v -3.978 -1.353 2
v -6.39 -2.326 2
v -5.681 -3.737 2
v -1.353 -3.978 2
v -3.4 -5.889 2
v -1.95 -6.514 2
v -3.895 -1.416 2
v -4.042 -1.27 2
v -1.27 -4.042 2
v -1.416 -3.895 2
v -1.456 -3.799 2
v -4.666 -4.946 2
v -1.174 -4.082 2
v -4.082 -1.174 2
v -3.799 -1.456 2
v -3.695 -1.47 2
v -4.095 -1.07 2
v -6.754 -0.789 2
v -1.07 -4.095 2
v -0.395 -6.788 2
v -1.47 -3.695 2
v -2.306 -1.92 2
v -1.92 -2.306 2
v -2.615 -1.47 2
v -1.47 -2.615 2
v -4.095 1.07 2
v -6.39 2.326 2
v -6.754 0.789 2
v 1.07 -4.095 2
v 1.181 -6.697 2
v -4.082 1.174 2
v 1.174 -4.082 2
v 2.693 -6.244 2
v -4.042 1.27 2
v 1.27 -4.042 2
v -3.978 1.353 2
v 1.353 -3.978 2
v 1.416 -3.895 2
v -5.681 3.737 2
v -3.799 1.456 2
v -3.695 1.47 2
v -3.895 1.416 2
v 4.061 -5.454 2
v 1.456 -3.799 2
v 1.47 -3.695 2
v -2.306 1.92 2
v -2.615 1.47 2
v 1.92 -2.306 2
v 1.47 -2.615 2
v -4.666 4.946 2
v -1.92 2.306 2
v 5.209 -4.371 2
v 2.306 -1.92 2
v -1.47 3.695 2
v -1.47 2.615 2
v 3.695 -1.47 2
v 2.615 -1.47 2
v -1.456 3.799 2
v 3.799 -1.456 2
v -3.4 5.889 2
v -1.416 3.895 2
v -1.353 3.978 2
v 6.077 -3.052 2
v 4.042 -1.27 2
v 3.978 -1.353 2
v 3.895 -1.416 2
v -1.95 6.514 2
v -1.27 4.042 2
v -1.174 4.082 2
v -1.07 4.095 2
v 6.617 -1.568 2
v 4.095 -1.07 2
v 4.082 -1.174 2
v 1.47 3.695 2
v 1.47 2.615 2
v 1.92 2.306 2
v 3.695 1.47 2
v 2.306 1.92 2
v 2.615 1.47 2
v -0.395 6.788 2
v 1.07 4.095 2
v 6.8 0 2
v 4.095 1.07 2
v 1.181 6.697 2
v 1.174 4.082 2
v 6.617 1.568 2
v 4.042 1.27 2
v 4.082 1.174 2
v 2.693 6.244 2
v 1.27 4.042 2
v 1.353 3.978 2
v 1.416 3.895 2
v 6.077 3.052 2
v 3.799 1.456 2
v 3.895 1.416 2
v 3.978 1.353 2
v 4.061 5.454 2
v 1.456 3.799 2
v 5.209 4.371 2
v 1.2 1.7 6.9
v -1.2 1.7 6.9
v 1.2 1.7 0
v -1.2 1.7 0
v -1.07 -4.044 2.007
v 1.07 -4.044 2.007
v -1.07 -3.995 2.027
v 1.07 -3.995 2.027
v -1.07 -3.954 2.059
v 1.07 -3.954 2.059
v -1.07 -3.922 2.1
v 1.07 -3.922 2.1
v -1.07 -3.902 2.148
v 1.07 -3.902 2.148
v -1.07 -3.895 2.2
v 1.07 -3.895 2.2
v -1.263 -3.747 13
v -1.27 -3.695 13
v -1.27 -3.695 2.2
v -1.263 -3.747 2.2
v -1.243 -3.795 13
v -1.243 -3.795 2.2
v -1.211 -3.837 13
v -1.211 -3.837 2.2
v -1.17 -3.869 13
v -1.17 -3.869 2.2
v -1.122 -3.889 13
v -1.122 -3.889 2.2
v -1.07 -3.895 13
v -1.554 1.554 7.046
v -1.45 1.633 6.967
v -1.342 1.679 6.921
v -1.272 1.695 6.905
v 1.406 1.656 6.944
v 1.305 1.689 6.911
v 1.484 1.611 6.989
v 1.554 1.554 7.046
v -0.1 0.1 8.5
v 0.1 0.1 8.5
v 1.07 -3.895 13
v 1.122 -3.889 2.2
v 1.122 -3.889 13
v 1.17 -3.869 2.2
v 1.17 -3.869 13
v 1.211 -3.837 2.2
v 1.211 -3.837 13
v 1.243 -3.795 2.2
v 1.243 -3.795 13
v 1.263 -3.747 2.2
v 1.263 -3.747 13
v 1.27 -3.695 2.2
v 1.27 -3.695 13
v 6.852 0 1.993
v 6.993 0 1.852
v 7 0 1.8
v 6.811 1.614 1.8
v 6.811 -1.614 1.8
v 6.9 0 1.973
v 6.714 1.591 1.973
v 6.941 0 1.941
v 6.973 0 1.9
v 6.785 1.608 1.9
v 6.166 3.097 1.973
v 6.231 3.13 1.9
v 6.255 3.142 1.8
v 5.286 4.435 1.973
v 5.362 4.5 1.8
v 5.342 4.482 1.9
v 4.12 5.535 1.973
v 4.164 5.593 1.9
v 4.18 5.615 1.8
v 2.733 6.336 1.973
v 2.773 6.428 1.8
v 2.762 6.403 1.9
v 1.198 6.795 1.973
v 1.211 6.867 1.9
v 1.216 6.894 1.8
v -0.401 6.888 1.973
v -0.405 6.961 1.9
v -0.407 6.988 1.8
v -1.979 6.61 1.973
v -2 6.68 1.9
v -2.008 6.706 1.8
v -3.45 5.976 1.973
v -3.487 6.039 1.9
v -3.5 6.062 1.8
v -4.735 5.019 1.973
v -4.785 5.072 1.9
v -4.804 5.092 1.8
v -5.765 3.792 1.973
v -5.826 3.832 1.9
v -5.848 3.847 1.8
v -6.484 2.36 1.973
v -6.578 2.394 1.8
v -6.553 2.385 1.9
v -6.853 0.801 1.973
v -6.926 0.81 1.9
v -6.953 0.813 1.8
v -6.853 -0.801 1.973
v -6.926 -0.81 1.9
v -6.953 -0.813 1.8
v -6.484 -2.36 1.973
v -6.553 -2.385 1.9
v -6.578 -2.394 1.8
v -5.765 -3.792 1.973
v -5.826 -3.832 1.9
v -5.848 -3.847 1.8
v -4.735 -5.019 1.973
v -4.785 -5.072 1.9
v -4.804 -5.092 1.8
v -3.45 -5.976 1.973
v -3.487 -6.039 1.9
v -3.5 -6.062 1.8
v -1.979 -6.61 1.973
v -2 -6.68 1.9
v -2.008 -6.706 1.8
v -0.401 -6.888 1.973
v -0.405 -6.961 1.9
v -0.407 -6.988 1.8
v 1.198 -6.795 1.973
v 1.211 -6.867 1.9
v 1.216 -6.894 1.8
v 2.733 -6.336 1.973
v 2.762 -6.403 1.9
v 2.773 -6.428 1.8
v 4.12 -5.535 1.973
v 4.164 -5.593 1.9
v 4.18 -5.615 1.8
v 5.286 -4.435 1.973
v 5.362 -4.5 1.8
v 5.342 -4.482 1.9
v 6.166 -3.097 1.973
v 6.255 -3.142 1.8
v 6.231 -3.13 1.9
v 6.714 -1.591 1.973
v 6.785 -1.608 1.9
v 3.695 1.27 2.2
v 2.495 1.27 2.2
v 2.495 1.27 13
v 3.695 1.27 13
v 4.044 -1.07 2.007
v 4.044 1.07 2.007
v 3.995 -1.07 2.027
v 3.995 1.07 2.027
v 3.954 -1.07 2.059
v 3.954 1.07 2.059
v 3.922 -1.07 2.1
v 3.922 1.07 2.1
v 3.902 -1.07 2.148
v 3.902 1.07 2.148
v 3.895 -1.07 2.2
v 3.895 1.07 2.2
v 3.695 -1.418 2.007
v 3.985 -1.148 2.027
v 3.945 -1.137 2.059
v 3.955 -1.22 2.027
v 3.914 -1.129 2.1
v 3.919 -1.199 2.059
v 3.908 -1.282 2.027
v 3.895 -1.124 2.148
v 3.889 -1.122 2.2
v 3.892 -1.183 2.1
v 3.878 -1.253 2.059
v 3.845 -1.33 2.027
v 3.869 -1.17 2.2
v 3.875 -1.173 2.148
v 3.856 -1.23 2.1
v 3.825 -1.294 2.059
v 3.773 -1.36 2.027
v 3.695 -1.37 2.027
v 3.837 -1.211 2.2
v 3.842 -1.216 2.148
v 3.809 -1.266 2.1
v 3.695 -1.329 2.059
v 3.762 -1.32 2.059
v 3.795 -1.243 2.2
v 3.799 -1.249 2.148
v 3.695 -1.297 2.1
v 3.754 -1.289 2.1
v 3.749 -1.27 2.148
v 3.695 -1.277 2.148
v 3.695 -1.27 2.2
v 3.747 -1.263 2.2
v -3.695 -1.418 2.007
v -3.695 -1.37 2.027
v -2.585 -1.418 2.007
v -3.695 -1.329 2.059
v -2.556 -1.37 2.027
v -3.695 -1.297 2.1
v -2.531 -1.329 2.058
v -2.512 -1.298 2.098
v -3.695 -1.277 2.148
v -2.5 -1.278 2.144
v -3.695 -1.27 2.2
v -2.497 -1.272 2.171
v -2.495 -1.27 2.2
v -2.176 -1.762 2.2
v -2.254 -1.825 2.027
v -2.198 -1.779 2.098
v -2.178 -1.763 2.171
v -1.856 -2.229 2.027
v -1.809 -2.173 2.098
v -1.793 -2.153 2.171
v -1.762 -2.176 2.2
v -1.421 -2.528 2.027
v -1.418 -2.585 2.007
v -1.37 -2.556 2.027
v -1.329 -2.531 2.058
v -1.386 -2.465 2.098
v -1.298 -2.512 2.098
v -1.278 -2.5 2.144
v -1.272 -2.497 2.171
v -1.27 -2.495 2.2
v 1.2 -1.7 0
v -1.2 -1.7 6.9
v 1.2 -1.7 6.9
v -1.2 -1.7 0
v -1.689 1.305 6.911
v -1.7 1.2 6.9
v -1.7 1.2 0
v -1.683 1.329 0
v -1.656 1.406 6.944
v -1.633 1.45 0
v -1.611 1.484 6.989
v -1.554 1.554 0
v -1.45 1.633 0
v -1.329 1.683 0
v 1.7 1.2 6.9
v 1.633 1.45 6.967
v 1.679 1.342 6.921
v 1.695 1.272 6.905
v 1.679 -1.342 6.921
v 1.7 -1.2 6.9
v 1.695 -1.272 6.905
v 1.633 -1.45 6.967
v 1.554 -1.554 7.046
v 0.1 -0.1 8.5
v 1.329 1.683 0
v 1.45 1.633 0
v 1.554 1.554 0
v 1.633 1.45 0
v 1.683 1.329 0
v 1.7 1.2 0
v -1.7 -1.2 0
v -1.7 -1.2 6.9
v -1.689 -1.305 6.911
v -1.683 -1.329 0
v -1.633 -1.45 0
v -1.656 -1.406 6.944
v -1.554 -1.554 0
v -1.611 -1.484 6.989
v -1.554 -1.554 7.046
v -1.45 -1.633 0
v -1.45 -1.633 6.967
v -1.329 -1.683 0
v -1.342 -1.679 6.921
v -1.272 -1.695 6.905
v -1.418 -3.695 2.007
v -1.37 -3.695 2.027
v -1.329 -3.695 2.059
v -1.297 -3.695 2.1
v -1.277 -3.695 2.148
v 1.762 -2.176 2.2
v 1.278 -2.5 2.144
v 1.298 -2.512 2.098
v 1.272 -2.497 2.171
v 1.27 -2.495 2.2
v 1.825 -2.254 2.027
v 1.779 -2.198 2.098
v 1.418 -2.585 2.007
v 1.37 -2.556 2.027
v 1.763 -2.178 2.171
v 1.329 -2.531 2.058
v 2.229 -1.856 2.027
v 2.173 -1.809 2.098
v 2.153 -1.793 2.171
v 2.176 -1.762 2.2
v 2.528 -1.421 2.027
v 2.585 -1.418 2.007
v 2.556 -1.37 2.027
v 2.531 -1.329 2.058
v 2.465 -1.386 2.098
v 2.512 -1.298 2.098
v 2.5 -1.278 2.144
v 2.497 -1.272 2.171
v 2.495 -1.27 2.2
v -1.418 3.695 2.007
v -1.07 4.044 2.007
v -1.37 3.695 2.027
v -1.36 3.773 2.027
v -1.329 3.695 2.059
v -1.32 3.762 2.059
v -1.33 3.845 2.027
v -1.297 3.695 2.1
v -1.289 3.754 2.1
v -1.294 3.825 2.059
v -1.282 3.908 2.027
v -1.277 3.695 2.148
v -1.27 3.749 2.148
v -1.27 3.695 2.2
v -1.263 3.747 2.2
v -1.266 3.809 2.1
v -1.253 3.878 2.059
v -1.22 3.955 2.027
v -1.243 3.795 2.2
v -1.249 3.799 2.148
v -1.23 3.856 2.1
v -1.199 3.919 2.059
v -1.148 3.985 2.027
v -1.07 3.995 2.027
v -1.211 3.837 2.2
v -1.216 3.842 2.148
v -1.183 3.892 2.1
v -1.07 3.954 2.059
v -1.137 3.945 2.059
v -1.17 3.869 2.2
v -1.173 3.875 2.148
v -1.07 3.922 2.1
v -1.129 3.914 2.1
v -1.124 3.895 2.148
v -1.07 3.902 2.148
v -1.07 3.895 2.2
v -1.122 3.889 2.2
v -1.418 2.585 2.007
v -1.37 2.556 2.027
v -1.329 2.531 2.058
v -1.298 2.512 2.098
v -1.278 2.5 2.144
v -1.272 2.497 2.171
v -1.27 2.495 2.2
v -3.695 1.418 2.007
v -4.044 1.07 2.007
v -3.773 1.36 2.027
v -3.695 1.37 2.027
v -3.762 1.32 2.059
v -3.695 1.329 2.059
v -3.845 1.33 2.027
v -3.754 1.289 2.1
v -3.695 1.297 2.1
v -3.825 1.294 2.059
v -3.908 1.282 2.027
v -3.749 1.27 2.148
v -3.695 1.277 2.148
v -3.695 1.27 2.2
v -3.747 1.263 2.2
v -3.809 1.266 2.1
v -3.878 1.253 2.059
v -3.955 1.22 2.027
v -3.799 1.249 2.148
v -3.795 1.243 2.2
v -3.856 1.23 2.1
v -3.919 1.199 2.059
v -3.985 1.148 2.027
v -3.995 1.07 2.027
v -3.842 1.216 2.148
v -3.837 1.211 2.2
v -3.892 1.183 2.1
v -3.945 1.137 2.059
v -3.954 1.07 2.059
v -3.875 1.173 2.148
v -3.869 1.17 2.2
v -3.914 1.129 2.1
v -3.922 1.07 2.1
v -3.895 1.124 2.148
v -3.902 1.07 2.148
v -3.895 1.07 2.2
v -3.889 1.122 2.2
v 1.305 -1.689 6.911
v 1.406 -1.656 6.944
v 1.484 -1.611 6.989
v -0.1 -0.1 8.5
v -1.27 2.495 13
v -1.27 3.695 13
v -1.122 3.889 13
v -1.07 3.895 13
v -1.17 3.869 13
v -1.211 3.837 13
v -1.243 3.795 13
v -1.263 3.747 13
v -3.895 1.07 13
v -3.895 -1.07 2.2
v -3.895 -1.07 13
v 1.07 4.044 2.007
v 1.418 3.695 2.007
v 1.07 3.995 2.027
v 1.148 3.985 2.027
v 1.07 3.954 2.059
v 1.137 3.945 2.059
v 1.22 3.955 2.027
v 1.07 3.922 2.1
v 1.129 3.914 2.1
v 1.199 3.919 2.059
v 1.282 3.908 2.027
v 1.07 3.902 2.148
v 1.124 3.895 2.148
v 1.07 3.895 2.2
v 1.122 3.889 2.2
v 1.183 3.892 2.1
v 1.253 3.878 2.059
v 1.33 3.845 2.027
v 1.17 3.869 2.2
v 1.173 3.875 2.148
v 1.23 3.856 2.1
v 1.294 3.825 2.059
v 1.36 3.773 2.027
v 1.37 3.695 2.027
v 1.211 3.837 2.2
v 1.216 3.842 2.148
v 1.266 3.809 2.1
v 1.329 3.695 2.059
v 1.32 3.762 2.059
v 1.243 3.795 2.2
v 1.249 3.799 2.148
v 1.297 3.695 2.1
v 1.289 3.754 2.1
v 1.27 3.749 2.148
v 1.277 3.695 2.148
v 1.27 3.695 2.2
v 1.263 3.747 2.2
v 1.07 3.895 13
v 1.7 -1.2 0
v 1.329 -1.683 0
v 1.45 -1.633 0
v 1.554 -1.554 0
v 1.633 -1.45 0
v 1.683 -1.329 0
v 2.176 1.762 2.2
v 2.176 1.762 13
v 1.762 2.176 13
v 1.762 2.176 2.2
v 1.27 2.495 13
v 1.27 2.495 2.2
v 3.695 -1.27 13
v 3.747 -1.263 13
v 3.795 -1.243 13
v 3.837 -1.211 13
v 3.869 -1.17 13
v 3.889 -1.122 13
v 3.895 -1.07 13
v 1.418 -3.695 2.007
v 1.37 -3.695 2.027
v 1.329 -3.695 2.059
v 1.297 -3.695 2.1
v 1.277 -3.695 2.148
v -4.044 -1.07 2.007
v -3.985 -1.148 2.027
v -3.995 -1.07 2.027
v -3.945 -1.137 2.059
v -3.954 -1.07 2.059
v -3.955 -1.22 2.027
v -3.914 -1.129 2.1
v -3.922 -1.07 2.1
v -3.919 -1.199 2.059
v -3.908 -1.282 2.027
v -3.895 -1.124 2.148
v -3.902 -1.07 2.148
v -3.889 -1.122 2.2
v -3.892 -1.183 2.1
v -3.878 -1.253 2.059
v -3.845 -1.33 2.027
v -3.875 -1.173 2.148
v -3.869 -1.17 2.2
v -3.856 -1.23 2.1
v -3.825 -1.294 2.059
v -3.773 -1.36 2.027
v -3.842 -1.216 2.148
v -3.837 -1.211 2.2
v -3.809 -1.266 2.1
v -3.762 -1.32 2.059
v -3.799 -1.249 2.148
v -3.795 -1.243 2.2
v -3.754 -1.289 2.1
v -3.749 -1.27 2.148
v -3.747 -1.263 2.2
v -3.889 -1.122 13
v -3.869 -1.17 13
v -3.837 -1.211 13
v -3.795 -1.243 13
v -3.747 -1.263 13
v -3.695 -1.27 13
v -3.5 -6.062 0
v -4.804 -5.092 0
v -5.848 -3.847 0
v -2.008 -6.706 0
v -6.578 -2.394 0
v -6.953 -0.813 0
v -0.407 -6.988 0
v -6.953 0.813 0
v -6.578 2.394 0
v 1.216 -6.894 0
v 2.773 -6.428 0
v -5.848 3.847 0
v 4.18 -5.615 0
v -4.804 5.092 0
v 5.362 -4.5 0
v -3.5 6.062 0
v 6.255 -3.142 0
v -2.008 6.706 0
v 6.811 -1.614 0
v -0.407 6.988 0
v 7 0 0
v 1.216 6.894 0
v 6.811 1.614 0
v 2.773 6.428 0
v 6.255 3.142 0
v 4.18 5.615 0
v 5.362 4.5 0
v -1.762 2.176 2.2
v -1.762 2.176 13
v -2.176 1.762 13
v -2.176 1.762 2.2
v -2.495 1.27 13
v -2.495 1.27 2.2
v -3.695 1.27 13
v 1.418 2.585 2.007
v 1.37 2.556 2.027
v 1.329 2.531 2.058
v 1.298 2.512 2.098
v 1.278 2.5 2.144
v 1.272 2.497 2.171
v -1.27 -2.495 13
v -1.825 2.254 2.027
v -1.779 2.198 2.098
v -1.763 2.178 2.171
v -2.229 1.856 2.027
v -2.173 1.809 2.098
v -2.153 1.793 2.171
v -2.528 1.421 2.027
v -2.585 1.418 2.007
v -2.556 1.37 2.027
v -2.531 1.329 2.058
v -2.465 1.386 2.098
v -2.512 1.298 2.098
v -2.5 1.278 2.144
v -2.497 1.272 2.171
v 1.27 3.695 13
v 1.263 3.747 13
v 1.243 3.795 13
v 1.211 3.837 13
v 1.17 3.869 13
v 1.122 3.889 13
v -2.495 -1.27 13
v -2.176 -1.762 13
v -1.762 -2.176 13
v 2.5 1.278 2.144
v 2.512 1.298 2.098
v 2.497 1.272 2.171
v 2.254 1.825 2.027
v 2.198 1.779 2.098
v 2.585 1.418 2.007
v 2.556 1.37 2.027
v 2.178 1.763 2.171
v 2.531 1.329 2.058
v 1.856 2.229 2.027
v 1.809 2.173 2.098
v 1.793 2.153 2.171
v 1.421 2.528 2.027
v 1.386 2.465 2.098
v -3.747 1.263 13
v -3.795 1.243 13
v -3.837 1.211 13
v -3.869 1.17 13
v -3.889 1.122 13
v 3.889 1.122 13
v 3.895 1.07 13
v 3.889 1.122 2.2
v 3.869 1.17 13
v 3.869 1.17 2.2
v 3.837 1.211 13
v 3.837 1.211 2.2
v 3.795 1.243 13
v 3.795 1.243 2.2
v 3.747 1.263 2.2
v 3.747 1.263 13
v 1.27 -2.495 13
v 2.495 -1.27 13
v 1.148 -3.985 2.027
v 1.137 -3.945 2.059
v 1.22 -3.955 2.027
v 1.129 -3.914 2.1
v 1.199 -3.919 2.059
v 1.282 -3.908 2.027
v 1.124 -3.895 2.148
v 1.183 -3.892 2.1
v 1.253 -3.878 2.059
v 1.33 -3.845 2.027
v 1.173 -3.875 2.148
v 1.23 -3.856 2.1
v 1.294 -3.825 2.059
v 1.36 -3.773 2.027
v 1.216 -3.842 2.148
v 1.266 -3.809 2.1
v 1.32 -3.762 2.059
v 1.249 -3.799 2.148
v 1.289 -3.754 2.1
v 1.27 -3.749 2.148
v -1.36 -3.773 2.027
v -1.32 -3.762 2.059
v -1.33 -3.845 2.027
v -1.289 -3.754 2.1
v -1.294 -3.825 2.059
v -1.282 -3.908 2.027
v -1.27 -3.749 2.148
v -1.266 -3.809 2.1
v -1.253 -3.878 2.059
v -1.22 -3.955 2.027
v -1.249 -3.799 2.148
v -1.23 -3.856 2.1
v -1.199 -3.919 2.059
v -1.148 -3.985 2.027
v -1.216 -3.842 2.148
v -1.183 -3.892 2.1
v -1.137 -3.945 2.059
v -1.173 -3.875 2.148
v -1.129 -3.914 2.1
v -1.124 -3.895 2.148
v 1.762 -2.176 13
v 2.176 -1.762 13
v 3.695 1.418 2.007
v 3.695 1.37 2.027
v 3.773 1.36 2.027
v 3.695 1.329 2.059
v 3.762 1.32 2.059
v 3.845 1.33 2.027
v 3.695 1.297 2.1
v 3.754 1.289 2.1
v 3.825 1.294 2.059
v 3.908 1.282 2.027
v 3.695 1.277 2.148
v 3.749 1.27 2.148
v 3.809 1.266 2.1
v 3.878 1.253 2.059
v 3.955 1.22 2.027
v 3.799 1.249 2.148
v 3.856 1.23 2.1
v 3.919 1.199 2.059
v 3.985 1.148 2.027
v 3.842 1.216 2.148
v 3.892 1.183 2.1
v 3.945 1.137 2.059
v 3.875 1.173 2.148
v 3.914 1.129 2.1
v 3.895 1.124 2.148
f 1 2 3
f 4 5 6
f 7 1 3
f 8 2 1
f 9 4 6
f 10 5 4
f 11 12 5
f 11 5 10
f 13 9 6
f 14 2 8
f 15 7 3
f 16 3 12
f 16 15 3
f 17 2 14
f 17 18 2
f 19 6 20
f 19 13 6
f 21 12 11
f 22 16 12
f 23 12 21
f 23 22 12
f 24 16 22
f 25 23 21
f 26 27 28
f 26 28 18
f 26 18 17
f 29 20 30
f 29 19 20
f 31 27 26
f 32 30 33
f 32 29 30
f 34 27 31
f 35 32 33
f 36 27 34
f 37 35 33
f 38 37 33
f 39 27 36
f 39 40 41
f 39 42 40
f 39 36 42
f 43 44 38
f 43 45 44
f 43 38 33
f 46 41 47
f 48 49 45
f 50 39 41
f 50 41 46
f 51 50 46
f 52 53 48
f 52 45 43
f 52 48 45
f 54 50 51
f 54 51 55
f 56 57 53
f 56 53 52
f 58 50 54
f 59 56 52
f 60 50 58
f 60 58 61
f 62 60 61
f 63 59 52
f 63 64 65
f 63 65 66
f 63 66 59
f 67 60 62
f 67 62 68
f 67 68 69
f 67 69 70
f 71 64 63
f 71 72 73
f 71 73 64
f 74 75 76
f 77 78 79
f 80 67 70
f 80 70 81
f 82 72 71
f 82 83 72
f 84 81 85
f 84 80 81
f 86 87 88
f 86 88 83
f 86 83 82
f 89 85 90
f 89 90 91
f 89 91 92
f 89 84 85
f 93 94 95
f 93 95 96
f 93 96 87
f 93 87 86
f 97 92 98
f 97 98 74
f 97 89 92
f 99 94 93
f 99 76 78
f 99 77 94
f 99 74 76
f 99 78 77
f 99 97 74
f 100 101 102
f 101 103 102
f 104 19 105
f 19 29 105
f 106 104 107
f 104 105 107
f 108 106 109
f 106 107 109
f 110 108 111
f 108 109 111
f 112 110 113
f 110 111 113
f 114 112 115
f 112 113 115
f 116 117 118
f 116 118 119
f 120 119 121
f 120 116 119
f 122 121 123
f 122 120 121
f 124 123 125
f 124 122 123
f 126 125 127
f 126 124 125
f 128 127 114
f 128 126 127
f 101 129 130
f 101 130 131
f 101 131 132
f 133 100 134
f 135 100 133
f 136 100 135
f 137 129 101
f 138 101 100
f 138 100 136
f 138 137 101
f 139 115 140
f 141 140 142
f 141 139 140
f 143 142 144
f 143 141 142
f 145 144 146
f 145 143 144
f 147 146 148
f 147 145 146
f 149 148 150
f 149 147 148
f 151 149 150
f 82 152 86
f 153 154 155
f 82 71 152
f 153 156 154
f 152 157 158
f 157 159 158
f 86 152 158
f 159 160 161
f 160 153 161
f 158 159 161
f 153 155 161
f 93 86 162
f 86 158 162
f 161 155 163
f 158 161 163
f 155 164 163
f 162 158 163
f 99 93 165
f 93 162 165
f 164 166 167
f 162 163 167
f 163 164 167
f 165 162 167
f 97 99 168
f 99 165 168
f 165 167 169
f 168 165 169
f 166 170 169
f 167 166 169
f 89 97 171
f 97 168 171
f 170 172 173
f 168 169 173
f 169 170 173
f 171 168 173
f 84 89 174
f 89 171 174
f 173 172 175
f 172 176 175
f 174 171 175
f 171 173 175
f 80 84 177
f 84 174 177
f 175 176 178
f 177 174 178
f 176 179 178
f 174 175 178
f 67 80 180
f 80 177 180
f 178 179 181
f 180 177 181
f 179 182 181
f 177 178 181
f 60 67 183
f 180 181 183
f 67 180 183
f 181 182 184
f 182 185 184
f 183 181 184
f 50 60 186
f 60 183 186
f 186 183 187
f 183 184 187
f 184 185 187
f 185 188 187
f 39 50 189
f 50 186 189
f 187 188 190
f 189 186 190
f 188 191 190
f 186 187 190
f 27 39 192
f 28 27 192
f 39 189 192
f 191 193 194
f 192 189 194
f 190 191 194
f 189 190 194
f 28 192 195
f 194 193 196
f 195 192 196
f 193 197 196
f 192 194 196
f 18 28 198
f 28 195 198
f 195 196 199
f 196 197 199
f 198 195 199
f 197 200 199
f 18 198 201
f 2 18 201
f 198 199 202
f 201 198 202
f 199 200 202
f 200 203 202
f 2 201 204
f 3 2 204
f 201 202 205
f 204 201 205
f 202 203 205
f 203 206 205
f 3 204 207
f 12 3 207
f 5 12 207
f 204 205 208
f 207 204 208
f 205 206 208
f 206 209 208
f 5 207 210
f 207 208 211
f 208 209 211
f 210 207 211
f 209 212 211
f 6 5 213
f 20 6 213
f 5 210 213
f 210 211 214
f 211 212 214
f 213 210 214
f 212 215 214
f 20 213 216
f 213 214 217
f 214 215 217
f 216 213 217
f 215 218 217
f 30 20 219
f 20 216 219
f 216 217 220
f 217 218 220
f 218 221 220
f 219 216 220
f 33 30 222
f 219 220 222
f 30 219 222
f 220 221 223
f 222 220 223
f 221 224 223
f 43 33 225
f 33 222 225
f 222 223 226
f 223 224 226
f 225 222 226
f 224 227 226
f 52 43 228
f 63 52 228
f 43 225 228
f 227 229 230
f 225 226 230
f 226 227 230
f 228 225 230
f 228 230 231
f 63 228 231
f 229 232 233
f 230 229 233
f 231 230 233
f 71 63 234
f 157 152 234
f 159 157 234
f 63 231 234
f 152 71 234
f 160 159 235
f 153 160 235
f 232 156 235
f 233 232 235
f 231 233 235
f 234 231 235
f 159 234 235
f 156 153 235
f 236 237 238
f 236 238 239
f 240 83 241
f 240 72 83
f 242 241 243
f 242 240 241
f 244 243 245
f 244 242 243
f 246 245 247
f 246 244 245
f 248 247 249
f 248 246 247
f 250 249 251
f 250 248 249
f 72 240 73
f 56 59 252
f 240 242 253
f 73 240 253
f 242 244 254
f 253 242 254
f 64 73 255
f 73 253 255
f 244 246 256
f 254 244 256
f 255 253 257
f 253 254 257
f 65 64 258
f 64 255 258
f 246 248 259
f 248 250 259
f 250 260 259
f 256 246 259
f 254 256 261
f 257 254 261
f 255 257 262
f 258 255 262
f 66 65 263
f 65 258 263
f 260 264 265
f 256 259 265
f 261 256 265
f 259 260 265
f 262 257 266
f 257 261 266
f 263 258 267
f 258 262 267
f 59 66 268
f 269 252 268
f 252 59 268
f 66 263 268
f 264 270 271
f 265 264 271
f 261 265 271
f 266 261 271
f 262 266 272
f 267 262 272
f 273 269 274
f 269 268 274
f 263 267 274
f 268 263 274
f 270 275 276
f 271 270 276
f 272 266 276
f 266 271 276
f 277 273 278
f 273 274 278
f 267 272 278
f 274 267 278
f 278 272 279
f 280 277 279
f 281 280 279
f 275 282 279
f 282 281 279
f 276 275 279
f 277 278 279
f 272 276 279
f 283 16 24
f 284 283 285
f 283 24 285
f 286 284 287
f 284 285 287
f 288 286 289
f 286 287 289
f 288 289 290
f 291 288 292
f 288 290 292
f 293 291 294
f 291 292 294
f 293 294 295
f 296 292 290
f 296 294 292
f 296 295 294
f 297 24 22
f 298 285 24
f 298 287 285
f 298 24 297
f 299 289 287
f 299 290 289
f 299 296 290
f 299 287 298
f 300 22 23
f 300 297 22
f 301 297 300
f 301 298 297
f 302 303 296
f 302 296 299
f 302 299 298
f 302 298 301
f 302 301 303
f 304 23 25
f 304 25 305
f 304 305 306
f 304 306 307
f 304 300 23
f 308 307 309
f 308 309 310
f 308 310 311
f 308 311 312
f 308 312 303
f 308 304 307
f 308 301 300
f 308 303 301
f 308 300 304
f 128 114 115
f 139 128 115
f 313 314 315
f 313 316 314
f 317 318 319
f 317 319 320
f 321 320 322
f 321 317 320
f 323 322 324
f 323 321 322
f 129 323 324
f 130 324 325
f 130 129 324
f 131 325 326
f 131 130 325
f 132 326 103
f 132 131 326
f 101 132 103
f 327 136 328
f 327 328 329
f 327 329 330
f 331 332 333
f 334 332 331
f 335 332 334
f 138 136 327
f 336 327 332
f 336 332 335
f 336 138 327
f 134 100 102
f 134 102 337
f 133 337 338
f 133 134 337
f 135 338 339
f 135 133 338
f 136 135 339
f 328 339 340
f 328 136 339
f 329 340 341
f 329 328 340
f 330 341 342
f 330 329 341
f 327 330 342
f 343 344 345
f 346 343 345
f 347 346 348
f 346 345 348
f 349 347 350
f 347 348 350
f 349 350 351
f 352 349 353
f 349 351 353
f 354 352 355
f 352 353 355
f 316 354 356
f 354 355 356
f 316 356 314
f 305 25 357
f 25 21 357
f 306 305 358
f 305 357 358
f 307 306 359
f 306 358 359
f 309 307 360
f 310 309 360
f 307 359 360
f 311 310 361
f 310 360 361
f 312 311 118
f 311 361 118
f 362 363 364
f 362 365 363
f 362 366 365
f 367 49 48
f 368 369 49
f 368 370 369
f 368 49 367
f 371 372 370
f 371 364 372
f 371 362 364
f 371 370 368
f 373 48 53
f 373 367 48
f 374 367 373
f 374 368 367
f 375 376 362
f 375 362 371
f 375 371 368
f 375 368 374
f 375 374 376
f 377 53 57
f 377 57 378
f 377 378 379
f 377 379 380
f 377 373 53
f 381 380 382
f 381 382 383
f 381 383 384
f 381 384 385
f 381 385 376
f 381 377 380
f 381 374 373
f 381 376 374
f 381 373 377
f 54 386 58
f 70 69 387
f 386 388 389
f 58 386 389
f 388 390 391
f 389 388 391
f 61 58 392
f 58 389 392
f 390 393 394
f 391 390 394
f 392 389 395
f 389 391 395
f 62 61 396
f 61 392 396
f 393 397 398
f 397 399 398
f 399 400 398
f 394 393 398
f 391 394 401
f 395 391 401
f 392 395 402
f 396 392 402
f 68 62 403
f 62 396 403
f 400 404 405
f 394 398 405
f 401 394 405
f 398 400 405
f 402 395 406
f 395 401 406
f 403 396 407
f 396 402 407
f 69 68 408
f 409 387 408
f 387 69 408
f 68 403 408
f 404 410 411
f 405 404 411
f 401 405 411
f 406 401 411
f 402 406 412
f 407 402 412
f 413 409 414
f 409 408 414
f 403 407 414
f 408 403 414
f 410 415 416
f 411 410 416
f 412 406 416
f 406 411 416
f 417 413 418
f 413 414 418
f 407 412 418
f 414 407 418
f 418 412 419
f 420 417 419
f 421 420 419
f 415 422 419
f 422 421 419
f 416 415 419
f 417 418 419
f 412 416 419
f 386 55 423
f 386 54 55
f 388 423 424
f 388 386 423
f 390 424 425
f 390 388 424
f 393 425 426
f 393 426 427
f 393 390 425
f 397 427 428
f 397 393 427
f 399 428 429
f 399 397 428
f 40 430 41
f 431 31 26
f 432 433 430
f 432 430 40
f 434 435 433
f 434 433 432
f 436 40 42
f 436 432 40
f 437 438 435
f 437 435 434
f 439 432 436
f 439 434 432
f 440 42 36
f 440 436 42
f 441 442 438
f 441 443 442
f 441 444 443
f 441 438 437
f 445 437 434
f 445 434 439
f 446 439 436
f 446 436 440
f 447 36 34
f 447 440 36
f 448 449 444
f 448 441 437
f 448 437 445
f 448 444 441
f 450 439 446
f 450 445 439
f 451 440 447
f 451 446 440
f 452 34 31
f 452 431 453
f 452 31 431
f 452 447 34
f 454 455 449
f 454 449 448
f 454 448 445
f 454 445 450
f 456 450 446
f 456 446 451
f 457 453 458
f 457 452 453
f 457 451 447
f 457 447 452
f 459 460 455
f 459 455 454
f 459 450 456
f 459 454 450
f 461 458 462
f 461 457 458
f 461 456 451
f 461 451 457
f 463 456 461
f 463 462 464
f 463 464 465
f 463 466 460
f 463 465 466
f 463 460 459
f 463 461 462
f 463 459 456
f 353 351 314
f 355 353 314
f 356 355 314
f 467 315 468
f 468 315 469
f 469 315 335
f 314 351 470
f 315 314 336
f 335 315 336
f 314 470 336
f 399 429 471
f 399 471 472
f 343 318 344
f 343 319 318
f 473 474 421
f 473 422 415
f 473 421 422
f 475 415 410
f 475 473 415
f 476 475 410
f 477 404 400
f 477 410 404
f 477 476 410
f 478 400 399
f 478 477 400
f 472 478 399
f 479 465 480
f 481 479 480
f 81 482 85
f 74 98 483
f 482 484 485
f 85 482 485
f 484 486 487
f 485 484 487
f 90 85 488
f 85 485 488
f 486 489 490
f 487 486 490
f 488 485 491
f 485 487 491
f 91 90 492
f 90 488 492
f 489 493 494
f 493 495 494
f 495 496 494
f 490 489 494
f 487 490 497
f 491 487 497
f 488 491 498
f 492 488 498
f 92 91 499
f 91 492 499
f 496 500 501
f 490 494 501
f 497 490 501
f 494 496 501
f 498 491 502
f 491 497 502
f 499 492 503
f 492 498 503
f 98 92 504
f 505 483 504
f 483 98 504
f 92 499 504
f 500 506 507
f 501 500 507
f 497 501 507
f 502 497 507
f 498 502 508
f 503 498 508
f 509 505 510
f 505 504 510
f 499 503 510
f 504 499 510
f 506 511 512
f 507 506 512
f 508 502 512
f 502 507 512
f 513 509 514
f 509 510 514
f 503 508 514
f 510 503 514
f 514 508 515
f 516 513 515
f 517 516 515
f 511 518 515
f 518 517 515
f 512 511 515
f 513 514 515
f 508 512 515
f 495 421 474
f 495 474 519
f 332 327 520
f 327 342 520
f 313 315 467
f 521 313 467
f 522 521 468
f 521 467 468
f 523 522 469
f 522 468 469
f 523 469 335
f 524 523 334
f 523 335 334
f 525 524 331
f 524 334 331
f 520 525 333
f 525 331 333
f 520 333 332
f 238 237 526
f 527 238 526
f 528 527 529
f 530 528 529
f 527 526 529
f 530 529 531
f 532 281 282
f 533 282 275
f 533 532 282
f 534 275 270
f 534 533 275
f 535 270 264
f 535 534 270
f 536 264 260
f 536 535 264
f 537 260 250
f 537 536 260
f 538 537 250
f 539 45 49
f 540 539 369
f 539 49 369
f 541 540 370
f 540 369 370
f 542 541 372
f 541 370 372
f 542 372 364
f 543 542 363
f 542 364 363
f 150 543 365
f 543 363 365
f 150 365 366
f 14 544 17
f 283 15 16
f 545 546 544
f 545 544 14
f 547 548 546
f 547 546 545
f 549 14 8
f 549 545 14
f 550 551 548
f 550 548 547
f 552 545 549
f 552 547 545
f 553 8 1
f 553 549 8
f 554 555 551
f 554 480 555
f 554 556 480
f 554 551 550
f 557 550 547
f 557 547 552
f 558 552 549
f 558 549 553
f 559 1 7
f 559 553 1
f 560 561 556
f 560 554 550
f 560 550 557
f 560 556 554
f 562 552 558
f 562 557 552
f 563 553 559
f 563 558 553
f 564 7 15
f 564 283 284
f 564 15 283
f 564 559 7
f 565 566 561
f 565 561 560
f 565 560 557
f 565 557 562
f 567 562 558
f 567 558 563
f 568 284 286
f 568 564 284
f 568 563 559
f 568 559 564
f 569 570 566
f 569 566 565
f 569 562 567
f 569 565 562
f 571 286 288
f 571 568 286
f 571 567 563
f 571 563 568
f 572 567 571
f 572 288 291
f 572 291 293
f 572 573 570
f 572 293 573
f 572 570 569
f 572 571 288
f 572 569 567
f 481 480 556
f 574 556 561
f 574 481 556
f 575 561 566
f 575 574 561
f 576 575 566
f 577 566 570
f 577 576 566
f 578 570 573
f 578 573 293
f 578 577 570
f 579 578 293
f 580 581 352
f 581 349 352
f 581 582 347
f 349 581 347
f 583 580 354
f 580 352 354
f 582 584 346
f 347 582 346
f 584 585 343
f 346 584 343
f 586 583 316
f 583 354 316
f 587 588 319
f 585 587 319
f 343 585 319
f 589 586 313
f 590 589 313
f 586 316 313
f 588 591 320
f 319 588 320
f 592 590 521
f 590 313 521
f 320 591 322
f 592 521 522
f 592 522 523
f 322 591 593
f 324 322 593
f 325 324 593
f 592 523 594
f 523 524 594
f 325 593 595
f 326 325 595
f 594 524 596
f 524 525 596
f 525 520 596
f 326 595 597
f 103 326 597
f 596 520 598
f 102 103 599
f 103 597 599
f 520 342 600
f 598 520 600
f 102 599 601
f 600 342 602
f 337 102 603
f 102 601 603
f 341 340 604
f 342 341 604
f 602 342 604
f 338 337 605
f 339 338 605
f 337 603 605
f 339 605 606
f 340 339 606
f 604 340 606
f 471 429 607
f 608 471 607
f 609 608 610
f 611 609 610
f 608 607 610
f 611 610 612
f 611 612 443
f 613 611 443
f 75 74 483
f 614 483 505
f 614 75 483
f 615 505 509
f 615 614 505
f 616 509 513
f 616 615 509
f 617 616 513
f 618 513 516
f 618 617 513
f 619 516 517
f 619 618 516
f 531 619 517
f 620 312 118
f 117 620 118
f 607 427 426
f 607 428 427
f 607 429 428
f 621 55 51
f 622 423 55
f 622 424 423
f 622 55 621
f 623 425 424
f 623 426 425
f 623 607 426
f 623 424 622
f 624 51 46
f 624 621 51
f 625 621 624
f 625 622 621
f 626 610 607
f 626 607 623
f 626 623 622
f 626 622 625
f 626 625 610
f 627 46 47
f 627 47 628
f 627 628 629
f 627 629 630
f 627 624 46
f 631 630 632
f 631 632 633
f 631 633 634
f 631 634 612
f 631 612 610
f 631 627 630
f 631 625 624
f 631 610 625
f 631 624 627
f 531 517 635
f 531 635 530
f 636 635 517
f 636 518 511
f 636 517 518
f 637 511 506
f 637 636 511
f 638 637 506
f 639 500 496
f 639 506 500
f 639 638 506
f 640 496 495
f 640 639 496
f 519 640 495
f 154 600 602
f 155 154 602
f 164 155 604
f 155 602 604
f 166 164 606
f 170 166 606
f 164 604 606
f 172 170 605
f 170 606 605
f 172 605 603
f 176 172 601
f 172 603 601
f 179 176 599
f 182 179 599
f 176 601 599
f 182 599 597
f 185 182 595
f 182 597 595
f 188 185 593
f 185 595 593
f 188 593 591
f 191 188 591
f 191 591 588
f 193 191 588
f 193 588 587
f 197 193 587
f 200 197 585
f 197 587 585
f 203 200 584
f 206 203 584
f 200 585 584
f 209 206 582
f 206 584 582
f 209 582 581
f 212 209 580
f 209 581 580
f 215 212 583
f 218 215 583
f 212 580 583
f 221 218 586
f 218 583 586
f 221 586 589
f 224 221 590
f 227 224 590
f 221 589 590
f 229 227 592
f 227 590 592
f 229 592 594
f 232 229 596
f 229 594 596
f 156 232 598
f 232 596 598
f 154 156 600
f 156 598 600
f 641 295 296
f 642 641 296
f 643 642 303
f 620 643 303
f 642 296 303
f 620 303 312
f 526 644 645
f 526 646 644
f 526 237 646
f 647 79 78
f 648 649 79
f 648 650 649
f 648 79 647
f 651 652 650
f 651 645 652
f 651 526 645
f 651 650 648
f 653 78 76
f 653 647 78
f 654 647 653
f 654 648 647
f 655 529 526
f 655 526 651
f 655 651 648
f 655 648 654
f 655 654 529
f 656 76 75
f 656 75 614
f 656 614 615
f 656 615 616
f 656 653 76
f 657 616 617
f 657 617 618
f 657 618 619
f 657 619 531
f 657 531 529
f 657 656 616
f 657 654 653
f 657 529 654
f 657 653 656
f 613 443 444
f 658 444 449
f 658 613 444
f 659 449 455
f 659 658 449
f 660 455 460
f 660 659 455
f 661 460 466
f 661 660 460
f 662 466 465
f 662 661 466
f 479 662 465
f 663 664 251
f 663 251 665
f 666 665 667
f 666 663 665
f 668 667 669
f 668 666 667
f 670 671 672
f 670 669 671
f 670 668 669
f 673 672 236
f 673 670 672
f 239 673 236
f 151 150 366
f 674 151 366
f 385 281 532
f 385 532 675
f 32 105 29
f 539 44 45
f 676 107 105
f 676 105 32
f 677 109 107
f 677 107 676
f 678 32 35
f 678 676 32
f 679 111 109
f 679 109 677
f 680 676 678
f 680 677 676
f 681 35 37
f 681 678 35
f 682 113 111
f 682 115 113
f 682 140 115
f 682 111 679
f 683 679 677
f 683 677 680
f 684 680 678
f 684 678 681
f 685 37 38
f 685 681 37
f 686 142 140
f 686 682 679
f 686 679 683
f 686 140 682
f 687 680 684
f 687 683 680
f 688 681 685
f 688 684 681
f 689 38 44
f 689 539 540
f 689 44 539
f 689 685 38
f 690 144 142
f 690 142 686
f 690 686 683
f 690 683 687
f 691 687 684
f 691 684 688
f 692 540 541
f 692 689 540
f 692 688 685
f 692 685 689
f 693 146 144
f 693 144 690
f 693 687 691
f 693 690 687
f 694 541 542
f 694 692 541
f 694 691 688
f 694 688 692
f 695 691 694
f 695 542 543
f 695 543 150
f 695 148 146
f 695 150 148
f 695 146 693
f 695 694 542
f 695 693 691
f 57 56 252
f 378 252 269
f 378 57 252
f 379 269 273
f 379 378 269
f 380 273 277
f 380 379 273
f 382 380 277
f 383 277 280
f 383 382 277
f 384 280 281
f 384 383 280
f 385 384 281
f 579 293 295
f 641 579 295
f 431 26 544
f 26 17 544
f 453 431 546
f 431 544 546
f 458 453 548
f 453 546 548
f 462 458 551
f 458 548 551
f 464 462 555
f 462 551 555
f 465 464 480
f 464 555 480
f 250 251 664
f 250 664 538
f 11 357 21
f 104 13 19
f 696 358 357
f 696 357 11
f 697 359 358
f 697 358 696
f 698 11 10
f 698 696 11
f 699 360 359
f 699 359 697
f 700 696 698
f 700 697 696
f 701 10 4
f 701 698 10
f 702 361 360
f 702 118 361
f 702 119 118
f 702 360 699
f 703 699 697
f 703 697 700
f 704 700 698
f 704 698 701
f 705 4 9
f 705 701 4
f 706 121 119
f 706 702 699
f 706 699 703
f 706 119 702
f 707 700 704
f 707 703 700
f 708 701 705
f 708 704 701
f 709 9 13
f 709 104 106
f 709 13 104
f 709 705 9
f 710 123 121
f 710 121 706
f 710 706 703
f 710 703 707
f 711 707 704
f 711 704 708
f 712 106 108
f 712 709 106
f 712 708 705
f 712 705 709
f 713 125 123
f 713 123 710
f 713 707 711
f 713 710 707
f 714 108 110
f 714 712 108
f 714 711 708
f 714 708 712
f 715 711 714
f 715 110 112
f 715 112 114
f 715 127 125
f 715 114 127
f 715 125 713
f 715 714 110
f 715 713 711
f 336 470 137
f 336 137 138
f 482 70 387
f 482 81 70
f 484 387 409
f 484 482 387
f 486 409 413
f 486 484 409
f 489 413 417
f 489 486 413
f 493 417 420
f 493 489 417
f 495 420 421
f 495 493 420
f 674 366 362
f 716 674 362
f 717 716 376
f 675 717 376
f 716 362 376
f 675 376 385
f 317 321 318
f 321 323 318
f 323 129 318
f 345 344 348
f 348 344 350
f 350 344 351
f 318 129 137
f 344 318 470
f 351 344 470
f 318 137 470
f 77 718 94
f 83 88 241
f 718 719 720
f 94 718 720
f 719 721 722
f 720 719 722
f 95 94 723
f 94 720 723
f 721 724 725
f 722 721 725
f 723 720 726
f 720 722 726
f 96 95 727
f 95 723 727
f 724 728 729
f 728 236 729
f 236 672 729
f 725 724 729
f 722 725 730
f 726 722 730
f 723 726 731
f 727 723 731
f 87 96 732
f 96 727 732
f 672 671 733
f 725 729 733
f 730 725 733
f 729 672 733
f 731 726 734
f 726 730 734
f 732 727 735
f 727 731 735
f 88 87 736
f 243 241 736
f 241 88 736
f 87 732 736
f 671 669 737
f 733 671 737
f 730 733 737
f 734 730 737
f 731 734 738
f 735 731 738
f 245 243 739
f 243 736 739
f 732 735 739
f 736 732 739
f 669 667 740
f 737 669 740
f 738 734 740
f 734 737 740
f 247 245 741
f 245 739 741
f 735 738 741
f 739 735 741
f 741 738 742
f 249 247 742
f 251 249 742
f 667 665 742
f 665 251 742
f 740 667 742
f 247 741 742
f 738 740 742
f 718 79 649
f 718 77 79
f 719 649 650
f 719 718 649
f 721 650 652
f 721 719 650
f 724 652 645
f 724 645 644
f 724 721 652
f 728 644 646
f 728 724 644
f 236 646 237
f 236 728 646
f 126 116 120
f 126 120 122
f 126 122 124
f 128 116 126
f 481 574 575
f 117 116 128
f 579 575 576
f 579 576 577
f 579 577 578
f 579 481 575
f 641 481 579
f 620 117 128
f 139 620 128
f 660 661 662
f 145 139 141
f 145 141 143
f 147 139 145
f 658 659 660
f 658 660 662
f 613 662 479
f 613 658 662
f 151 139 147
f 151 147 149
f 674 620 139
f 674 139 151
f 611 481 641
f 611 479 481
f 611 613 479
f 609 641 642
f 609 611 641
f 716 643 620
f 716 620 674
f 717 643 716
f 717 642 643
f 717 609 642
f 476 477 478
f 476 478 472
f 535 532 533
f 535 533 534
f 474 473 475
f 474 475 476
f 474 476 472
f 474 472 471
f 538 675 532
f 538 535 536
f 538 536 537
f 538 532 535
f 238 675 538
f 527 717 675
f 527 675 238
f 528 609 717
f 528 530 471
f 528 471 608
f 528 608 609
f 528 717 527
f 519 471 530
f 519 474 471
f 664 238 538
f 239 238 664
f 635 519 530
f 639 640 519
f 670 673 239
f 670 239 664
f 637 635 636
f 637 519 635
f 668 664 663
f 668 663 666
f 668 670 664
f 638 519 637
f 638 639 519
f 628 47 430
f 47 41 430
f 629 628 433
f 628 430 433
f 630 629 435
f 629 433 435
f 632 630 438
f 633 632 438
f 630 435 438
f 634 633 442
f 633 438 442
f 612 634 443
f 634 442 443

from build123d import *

# Parameters (mm, degrees)
SKETCH_R     = 7
PAD_DEPTH    = 2
PAD001_DEPTH = 11
SKETCH002_W  = 3.4
SKETCH002_H  = 3.4
POCKET_DEPTH = 8.5
FILLET_R     = 0.2
FILLET001_R  = 0.2
CHAMFER_SIZE = 1.6
FILLET002_R  = 0.5


with BuildPart() as part:
    # Sketch → Pad (new body)
    with BuildSketch(Plane.XY):
        Circle(SKETCH_R)
    extrude(amount=PAD_DEPTH)

    # Sketch001 (on Face3 of Pad) → Pad001 (join)
    with BuildSketch(Plane.XY.offset(2)):
        with BuildLine():
            ThreePointArc((-1.27, 2.495416), (-1.979899, 1.979899), (-2.495416, 1.27))
            Line((-2.495416, 1.27), (-3.895416, 1.27))
            Line((-3.895416, 1.27), (-3.895416, -1.27))
            Line((-3.895416, -1.27), (-2.495416, -1.27))
            ThreePointArc((-2.495416, -1.27), (-1.979899, -1.979899), (-1.27, -2.495416))
            Line((-1.27, -2.495416), (-1.27, -3.895416))
            Line((-1.27, -3.895416), (1.27, -3.895416))
            Line((1.27, -3.895416), (1.27, -2.495416))
            ThreePointArc((1.27, -2.495416), (1.979899, -1.979899), (2.495416, -1.27))
            Line((3.895416, -1.27), (2.495416, -1.27))
            Line((3.895416, 1.27), (3.895416, -1.27))
            Line((2.495416, 1.27), (3.895416, 1.27))
            ThreePointArc((2.495416, 1.27), (1.979899, 1.979899), (1.27, 2.495416))
            Line((1.27, 3.895416), (1.27, 2.495416))
            Line((-1.27, 3.895416), (1.27, 3.895416))
            Line((-1.27, 2.495416), (-1.27, 3.895416))
        make_face()
    extrude(amount=PAD001_DEPTH)

    # Sketch002 (on Face2 of Pad001) → Pocket (cut)
    with BuildSketch(Plane(origin=(0, 0, 0), x_dir=(1, 0, 0), z_dir=(0, 0, -1))):
        Rectangle(SKETCH002_W, SKETCH002_H)
    extrude(amount=-POCKET_DEPTH, mode=Mode.SUBTRACT)

    # Fillet
    fillet_edges = [part.edges().sort_by_distance(p)[0] for p in [
        (-3.895416, -1.27, 7.5),
        (-1.27, -3.895416, 7.5),
        (1.27, -3.895416, 7.5),
        (3.895416, -1.27, 7.5),
        (3.895416, 1.27, 7.5),
        (1.27, 3.895416, 7.5),
        (-1.27, 3.895416, 7.5),
        (-3.895416, 1.27, 7.5),
    ]]
    fillet(fillet_edges, radius=FILLET_R)

    # Fillet001
    fillet001_edges = [part.edges().sort_by_distance(p)[0] for p in [
        (1.27, 3.095416, 2),
        (1.211421, 3.836837, 2),
        (1.979899, 1.979899, 2),
        (0, 3.895416, 2),
        (3.095416, 1.27, 2),
        (-1.211421, 3.836837, 2),
        (3.836837, 1.211421, 2),
        (-1.27, 3.095416, 2),
        (3.895416, 0, 2),
        (-1.979899, 1.979899, 2),
        (3.836837, -1.211421, 2),
        (-3.095416, 1.27, 2),
        (3.095416, -1.27, 2),
        (-3.836837, 1.211421, 2),
        (1.979899, -1.979899, 2),
        (-3.895416, 0, 2),
        (1.27, -3.095416, 2),
        (-3.836837, -1.211421, 2),
        (1.211421, -3.836837, 2),
        (-3.095416, -1.27, 2),
        (0, -3.895416, 2),
        (-1.979899, -1.979899, 2),
        (-1.211421, -3.836837, 2),
        (-1.27, -3.095416, 2),
        (-7, 0, 2),
    ]]
    fillet(fillet001_edges, radius=FILLET001_R)

    # Chamfer
    chamfer_edges = [part.edges().sort_by_distance(p)[0] for p in [
        (-1.7, 0, 8.5),
        (0, -1.7, 8.5),
        (1.7, 0, 8.5),
        (0, 1.7, 8.5),
    ]]
    chamfer(chamfer_edges, length=CHAMFER_SIZE)

    # Fillet002
    fillet002_edges = [part.edges().sort_by_distance(p)[0] for p in [
        (-1.7, 1.7, 3.45),
        (-1.7, -1.7, 3.45),
        (1.7, -1.7, 3.45),
        (1.7, 1.7, 3.45),
    ]]
    fillet(fillet002_edges, radius=FILLET002_R)


solid = part.part
